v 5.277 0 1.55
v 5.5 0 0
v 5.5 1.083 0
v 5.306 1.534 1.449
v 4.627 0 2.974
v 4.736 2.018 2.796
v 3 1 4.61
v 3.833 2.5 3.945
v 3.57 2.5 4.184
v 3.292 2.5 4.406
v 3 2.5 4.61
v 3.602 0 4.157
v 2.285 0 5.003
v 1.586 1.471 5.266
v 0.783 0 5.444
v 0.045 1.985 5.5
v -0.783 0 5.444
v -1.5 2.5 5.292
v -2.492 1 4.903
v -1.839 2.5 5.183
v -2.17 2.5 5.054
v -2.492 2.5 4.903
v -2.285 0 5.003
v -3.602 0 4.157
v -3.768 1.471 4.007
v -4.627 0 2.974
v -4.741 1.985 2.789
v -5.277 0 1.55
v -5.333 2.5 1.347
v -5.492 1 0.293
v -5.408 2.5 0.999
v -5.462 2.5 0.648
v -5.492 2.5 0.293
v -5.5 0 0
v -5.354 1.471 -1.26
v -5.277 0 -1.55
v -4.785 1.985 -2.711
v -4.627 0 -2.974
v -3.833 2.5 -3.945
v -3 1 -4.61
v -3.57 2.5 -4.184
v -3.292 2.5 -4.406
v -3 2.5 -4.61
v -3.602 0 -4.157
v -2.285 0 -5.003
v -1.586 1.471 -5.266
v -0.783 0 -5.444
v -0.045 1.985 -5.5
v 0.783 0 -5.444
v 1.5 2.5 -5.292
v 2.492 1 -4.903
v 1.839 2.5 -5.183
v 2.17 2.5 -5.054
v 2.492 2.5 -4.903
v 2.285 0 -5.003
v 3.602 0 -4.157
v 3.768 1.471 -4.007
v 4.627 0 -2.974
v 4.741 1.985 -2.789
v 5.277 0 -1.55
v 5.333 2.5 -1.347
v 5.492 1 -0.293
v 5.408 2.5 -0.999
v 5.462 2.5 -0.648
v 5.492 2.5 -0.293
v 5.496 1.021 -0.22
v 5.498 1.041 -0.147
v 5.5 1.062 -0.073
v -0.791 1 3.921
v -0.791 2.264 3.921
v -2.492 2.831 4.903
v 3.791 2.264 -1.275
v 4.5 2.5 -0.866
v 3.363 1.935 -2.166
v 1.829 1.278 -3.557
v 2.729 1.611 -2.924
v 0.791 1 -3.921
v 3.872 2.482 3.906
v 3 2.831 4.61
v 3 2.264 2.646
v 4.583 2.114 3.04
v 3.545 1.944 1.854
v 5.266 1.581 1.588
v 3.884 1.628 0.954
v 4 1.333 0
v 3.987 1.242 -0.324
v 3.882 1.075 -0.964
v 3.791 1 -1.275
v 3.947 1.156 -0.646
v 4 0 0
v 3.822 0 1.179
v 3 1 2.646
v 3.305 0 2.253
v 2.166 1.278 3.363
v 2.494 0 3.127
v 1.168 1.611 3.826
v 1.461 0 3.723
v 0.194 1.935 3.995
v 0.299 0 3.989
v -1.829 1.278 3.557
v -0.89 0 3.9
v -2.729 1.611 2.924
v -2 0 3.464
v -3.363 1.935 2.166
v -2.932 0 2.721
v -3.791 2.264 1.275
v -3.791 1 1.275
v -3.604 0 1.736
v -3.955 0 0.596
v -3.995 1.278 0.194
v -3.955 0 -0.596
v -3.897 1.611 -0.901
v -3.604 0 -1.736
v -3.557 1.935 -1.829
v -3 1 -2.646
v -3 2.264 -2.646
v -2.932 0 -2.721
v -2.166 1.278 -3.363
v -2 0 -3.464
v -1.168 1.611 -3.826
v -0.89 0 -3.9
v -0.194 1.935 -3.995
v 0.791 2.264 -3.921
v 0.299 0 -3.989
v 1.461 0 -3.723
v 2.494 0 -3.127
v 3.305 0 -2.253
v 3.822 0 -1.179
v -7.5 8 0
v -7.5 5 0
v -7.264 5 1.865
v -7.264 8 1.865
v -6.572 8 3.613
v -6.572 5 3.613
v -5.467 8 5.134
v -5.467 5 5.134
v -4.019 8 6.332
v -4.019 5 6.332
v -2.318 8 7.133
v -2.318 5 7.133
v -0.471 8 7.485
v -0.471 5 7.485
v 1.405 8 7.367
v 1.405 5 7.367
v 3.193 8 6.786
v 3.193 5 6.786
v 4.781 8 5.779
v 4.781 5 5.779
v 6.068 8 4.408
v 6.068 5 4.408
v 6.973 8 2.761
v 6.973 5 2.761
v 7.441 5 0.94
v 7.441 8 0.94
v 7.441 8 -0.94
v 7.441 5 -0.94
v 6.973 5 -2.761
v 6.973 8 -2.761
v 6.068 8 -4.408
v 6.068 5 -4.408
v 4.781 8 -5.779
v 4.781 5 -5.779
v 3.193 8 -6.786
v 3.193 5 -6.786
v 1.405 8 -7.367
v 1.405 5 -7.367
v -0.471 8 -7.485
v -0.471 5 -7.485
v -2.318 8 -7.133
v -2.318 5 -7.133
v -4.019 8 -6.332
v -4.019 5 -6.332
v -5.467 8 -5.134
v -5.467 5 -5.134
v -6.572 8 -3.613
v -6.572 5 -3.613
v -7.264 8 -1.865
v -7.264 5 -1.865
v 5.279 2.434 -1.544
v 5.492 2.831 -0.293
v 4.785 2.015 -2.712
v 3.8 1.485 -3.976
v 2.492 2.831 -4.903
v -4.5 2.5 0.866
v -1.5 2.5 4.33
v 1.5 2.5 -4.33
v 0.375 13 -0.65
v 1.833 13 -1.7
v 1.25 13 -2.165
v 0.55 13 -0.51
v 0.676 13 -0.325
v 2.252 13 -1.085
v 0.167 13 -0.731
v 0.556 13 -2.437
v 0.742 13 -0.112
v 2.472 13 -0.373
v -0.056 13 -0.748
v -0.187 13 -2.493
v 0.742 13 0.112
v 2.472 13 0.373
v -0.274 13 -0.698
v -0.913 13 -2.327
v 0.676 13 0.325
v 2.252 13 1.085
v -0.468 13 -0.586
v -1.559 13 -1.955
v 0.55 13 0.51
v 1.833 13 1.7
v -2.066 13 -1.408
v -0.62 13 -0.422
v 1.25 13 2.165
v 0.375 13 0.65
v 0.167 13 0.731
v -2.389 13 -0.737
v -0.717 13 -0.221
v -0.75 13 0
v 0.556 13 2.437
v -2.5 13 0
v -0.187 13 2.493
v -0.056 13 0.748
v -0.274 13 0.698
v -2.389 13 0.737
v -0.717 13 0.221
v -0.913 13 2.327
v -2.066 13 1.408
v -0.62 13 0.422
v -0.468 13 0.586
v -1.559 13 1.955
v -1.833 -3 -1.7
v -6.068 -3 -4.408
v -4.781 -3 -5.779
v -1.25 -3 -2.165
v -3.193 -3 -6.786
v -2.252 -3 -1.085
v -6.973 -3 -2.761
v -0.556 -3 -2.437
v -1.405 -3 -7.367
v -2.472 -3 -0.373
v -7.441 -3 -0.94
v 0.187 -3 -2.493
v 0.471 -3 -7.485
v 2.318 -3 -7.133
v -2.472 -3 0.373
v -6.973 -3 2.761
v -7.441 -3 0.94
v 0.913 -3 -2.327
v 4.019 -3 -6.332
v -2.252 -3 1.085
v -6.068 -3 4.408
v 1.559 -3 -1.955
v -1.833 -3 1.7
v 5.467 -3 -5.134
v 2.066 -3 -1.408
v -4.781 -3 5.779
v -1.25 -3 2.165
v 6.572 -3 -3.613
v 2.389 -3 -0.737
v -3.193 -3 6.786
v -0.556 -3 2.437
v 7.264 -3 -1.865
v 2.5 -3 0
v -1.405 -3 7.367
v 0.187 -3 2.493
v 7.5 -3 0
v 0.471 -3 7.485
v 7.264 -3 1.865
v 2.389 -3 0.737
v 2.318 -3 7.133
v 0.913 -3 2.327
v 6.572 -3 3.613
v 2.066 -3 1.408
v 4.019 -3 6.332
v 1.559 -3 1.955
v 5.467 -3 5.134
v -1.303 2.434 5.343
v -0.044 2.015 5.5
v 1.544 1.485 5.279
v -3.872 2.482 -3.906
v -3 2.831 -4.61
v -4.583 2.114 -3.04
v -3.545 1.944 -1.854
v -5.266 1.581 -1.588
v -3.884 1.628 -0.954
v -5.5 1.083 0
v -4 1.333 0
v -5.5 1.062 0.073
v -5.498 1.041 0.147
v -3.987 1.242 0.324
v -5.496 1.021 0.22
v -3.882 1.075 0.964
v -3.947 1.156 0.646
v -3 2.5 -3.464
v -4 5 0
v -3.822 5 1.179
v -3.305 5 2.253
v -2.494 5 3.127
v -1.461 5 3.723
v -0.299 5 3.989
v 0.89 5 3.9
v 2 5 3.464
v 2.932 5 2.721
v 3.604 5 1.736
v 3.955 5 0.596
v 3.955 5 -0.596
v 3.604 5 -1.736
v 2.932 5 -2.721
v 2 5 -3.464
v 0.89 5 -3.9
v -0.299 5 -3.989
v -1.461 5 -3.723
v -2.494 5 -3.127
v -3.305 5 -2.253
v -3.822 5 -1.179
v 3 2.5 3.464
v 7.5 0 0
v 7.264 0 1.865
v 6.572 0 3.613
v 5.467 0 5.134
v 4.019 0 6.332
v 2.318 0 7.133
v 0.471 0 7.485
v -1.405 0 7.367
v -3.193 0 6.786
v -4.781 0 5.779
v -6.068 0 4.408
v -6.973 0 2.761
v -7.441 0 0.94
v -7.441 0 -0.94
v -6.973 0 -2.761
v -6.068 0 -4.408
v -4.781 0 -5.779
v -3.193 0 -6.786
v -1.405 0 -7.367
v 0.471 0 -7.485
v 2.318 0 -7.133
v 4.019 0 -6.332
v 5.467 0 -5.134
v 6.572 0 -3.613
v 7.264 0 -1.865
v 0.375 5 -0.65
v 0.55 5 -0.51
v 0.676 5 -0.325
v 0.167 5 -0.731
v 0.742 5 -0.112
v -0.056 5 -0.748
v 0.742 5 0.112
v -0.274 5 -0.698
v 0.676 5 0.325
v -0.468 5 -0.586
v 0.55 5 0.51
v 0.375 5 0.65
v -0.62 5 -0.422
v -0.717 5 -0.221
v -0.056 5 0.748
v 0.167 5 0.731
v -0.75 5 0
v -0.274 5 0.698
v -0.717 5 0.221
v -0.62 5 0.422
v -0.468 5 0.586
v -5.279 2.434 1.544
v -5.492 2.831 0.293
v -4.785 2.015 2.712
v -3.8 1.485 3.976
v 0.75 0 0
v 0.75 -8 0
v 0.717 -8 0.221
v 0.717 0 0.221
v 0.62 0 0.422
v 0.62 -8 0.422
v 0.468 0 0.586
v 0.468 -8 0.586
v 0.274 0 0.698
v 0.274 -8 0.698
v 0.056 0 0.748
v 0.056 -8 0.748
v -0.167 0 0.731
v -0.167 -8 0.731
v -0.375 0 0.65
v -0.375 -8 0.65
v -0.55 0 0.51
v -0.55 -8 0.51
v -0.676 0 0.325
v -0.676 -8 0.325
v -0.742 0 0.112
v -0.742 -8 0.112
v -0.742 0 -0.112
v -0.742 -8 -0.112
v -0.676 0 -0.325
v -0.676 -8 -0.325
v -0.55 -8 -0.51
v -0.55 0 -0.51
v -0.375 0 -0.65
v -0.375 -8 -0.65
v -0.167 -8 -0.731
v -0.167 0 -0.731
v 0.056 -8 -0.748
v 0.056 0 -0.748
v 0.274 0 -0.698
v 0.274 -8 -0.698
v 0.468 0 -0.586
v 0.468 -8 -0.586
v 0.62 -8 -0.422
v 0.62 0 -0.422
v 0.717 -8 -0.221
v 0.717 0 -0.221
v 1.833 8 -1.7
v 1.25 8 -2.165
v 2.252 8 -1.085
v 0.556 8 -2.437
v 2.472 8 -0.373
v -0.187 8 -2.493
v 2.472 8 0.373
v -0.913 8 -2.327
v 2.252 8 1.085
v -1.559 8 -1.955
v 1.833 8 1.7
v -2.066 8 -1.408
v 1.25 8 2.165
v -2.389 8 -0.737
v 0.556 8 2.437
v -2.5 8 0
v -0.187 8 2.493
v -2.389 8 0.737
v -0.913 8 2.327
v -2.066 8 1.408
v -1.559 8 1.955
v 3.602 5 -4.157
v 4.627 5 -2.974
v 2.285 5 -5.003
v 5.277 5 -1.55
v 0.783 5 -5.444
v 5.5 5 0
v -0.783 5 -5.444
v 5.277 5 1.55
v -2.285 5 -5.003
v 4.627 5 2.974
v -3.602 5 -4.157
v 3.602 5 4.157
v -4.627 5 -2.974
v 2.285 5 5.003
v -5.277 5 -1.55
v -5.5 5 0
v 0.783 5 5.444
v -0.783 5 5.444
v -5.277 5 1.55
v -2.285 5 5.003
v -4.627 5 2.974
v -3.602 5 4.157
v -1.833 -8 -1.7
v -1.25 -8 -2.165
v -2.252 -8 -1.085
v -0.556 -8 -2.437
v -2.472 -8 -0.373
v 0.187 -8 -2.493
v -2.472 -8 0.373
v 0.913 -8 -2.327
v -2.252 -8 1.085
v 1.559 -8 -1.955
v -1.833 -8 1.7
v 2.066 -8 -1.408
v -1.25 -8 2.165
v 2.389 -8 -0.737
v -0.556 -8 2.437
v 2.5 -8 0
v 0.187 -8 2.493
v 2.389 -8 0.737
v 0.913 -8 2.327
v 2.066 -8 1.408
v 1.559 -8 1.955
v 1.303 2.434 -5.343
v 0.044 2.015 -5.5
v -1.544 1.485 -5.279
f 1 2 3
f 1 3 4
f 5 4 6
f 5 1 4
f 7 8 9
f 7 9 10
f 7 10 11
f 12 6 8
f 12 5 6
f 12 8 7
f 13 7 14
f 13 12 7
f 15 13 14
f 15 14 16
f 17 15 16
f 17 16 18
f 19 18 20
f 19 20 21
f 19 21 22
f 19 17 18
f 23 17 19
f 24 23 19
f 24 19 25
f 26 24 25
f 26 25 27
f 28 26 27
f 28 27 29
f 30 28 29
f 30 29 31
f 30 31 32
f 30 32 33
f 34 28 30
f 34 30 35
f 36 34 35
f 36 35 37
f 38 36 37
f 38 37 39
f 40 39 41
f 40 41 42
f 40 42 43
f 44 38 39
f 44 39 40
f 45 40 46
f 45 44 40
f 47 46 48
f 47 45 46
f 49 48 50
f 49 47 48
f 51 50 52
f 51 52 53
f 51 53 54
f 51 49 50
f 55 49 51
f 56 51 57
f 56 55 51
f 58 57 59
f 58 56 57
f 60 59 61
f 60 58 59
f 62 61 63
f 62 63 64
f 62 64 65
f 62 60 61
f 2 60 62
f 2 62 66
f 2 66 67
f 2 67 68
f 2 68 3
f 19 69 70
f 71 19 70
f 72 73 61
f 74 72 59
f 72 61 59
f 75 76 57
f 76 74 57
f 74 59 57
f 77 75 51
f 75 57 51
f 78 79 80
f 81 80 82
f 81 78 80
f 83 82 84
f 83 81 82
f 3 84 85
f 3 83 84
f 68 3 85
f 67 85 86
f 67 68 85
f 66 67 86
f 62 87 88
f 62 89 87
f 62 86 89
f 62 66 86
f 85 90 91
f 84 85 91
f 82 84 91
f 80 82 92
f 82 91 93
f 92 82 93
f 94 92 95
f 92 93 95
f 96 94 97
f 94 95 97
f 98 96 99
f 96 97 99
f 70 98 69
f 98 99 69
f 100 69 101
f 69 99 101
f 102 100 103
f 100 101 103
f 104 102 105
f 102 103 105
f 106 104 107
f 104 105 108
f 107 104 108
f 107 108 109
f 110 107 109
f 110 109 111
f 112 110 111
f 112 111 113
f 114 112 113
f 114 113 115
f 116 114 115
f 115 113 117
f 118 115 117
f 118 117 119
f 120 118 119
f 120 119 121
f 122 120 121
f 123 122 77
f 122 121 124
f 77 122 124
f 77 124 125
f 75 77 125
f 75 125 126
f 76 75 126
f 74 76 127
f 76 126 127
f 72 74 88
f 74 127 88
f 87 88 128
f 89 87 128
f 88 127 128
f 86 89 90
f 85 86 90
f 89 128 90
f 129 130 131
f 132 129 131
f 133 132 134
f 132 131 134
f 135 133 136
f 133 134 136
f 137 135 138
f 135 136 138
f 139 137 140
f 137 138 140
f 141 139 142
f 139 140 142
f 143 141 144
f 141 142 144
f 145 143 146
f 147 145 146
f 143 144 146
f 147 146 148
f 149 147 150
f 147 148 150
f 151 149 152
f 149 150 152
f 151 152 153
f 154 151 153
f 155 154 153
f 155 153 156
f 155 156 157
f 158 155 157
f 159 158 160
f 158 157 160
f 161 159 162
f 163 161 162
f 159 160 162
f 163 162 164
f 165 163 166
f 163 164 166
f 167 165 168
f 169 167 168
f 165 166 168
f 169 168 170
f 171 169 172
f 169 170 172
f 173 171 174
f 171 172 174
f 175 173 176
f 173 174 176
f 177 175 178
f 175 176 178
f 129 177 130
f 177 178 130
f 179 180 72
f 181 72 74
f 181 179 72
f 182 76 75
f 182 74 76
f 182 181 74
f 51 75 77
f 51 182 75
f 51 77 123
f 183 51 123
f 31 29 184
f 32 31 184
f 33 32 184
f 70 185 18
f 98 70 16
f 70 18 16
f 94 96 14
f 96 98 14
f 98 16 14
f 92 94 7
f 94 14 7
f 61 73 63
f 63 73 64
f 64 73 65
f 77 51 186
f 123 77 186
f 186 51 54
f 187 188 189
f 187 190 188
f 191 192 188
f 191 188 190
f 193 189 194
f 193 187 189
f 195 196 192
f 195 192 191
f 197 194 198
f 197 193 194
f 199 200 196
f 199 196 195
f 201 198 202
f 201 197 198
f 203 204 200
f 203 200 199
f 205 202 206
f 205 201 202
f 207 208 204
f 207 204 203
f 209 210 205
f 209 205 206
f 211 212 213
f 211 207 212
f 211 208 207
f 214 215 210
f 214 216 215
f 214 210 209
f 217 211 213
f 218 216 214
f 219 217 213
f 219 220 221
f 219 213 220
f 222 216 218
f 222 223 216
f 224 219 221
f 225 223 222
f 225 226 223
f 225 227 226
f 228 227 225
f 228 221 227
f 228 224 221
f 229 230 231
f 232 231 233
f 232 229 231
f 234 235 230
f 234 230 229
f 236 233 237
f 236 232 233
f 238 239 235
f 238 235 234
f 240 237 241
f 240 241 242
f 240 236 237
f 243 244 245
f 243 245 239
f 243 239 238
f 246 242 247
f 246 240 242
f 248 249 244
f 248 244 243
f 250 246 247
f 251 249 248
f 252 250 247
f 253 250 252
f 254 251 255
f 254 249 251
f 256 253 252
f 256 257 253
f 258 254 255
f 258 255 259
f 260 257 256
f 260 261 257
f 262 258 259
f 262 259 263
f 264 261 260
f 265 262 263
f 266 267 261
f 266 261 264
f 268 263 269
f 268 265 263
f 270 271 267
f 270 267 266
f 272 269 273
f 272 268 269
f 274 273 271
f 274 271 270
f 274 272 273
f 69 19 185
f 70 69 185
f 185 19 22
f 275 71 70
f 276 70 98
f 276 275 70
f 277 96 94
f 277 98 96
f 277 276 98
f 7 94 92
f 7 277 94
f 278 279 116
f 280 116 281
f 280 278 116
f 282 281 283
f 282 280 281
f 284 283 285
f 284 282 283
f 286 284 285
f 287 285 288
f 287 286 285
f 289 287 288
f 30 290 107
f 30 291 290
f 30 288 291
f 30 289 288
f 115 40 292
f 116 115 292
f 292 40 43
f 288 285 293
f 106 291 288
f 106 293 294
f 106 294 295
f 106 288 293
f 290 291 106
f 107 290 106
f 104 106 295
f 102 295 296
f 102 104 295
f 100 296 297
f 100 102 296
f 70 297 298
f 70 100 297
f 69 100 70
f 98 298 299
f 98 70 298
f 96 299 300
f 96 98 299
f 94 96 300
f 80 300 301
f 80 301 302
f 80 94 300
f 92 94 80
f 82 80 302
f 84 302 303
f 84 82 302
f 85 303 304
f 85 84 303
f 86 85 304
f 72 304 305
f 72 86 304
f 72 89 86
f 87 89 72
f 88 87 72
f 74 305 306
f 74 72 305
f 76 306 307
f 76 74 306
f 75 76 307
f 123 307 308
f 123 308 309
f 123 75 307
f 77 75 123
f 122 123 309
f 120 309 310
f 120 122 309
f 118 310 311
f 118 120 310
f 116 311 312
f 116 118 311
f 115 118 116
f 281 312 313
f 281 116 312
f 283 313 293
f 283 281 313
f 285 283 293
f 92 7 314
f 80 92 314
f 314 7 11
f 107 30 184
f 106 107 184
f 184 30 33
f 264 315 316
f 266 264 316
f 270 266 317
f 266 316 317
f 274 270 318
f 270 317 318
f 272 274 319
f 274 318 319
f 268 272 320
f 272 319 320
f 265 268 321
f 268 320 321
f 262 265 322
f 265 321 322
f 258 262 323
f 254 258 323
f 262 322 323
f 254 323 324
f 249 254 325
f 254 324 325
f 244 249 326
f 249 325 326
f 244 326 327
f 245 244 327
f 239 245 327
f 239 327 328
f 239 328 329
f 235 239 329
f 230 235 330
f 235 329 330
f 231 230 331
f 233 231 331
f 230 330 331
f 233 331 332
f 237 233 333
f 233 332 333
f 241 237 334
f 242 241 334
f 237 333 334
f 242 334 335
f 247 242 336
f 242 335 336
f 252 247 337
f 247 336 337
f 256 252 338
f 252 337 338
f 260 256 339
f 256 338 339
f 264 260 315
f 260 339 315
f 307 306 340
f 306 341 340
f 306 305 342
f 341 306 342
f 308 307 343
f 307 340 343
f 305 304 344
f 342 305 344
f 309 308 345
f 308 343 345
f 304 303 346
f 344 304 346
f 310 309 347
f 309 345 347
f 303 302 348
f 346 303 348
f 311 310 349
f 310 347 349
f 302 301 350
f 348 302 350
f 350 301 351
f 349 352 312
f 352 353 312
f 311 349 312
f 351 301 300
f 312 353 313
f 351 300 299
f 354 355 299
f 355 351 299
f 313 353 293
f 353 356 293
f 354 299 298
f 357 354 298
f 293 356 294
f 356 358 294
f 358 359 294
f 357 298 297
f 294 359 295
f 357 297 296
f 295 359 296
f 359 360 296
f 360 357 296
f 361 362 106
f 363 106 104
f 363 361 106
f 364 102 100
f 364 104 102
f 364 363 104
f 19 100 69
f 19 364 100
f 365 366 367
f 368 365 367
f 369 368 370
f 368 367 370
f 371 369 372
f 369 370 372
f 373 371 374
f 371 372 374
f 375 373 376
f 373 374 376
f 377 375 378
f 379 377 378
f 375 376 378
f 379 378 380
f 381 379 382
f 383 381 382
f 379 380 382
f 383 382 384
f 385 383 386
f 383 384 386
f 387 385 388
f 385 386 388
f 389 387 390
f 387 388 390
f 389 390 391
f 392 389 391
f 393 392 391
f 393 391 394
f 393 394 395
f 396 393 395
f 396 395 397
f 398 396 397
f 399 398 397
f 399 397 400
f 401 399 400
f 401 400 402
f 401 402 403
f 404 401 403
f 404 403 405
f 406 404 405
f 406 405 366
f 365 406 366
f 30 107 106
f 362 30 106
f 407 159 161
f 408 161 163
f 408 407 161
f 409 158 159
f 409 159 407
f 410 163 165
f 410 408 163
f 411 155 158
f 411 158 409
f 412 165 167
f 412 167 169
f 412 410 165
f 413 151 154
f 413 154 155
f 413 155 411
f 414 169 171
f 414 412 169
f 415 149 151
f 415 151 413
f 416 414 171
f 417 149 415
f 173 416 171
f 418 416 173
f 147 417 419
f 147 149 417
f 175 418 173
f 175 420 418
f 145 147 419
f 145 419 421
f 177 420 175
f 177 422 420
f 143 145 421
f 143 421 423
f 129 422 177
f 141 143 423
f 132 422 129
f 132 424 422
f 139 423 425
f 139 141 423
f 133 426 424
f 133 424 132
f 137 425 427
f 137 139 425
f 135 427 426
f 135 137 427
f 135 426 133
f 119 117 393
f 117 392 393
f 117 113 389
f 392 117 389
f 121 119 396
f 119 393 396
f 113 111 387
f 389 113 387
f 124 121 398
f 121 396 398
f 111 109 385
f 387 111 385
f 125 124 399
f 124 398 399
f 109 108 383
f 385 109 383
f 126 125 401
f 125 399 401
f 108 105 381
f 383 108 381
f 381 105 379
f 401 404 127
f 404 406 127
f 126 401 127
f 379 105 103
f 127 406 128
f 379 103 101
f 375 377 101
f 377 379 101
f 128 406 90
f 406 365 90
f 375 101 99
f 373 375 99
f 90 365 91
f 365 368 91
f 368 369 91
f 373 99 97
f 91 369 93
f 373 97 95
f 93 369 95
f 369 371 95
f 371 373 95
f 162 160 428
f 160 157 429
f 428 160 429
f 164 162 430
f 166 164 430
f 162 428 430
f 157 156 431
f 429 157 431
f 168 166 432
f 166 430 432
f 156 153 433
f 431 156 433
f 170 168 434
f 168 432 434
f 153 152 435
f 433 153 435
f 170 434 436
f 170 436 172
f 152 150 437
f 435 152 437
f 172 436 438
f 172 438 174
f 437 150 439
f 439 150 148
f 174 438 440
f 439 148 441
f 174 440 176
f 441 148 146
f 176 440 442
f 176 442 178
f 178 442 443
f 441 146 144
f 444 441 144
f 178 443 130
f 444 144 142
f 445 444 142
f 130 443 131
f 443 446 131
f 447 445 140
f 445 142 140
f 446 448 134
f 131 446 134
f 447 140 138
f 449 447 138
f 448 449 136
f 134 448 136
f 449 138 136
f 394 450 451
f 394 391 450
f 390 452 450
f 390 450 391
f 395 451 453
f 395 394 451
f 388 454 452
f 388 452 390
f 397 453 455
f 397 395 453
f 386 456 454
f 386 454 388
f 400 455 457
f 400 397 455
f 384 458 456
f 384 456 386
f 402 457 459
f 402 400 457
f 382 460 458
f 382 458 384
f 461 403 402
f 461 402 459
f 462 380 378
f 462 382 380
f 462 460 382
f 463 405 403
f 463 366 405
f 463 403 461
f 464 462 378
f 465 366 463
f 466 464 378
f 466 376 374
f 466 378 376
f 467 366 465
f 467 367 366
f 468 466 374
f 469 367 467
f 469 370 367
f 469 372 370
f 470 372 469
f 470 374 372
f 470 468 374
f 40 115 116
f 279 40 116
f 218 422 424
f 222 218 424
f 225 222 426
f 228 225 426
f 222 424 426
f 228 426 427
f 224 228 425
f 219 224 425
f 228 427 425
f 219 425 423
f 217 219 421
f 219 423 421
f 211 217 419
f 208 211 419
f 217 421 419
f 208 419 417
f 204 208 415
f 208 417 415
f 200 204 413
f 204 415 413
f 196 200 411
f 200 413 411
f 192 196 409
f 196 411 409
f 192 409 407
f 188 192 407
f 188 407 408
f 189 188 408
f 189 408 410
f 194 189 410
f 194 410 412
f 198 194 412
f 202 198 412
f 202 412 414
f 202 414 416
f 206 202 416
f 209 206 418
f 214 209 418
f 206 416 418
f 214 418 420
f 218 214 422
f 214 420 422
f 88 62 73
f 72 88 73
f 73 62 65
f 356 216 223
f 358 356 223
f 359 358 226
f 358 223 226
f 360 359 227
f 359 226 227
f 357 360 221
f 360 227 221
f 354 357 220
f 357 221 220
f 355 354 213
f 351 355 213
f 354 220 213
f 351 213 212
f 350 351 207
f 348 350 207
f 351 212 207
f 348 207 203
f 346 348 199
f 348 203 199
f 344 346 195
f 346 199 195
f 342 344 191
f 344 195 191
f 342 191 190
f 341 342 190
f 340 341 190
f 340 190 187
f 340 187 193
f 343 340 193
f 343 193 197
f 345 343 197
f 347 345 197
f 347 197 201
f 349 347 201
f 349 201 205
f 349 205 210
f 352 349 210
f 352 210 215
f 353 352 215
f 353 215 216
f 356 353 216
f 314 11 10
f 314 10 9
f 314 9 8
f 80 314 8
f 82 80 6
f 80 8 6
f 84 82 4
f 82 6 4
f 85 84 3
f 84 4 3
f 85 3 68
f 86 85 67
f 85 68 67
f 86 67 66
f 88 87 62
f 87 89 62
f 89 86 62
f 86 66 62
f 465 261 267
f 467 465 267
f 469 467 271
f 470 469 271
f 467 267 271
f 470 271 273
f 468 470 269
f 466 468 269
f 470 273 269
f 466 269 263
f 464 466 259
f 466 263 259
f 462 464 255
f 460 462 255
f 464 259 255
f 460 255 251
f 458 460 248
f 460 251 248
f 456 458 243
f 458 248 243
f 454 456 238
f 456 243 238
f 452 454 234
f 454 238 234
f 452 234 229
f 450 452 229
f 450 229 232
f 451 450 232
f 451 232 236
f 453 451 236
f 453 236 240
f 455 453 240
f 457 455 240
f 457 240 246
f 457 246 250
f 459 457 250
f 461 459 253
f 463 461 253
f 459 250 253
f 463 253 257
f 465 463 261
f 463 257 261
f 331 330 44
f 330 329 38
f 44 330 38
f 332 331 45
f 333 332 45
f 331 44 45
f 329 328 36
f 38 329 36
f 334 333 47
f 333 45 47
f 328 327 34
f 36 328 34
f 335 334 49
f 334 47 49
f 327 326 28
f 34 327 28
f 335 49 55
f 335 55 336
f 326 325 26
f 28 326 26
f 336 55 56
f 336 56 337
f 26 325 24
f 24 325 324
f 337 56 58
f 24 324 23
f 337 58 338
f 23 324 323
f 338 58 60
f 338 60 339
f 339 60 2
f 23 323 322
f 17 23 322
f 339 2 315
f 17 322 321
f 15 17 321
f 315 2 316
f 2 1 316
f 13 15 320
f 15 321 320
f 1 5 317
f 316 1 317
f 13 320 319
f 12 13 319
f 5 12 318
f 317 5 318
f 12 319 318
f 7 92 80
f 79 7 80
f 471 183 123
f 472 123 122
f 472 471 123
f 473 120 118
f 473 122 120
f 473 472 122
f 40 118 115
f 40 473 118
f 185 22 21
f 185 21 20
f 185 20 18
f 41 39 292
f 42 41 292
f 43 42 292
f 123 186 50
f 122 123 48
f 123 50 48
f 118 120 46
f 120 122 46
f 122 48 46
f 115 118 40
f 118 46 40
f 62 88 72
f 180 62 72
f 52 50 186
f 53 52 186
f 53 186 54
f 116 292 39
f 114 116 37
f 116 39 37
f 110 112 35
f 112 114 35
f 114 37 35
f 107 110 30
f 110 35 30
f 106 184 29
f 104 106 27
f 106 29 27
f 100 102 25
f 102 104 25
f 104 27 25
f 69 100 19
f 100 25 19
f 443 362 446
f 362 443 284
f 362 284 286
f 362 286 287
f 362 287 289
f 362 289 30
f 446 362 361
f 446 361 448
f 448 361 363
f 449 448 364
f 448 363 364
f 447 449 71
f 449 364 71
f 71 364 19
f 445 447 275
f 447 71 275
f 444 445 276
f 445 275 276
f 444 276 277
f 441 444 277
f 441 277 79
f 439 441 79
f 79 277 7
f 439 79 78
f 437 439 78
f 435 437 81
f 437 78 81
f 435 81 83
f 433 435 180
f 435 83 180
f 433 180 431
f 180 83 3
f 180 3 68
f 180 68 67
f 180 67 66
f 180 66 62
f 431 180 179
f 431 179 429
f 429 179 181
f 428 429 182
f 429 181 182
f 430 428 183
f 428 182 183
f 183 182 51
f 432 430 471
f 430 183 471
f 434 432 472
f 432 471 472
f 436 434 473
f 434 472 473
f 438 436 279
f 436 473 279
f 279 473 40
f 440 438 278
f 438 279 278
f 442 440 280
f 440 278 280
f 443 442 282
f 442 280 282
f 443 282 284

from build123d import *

# Parameters (mm, degrees)
F0_R      = 7.5
F1_DEPTH  = 3
F2_R      = 2.5
F3_DEPTH  = 5
F4_R      = 0.75
F5_DEPTH  = 8.001
F6_R      = 5.5
F6_R_2    = 4
F7_DEPTH  = 6
F10_DEPTH = 10
F11_COUNT = 6
F13_R     = 5.5
F13_R_2   = 4
F14_DEPTH = 5
F15_R     = 7.5
F16_DEPTH = 3
F17_R     = 2.5
F18_DEPTH = 5
F19_R     = 0.75
F20_DEPTH = 25
F22_R     = 7.5
F23_DEPTH = 2.5


with BuildPart() as f1:
    # F0 (on Front) → F1 (new body)
    with BuildSketch(Plane.XZ):
        Circle(F0_R)
    extrude(amount=F1_DEPTH)

    # F2 (on face) → F3 (join)
    with BuildSketch(Plane.XZ.offset(3)):
        Circle(F2_R)
    extrude(amount=F3_DEPTH)

    # F4 (on face) → F5 (cut, through all)
    with BuildSketch(Plane.XZ.offset(8)):
        Circle(F4_R)
    extrude(amount=-F5_DEPTH, mode=Mode.SUBTRACT)

    # F6 (on face) → F7 (join)
    with BuildSketch(Plane.XZ.offset(3)):
        Circle(F6_R)
        Circle(F6_R_2, mode=Mode.SUBTRACT)
    extrude(amount=-F7_DEPTH)


with BuildPart() as f10:
    # F9 (on offset) → F10 (new body)
    with BuildSketch(Plane.XY.offset(10)):
        Polygon((-3, 3), (3, 1), (3, 3), align=None)
    extrude(amount=-F10_DEPTH)


with BuildPart() as f11_1:
    # F11: instance of F10
    add(f10.part.rotate(Axis((0, 3, 0), (0, -1, 0)), 1 * 360 / F11_COUNT))


with BuildPart() as f11_2:
    # F11: instance of F10
    add(f10.part.rotate(Axis((0, 3, 0), (0, -1, 0)), 2 * 360 / F11_COUNT))


with BuildPart() as f11_3:
    # F11: instance of F10
    add(f10.part.rotate(Axis((0, 3, 0), (0, -1, 0)), 3 * 360 / F11_COUNT))


with BuildPart() as f11_4:
    # F11: instance of F10
    add(f10.part.rotate(Axis((0, 3, 0), (0, -1, 0)), 4 * 360 / F11_COUNT))


with BuildPart() as f11_5:
    # F11: instance of F10
    add(f10.part.rotate(Axis((0, 3, 0), (0, -1, 0)), 5 * 360 / F11_COUNT))


with BuildPart() as f1_1:
    add(f1.part)

    # F12: cut F11_3, F10, F11_4, F11_5, F11_1, F11_2
    add(f11_3.part, mode=Mode.SUBTRACT)
    add(f10.part, mode=Mode.SUBTRACT)
    add(f11_4.part, mode=Mode.SUBTRACT)
    add(f11_5.part, mode=Mode.SUBTRACT)
    add(f11_1.part, mode=Mode.SUBTRACT)
    add(f11_2.part, mode=Mode.SUBTRACT)


with BuildPart() as f14:
    # F13 (on face) → F14 (new body)
    with BuildSketch(Plane(origin=(0, 0, 0), x_dir=(-1, 0, 0), z_dir=(0, 1, 0))):
        Circle(F13_R)
        Circle(F13_R_2, mode=Mode.SUBTRACT)
    extrude(amount=F14_DEPTH)

    # F15 (on face) → F16 (join)
    with BuildSketch(Plane(origin=(0, 5, 0), x_dir=(-1, 0, 0), z_dir=(0, 1, 0))):
        Circle(F15_R)
    extrude(amount=F16_DEPTH)

    # F17 (on face) → F18 (join)
    with BuildSketch(Plane(origin=(0, 8, 0), x_dir=(-1, 0, 0), z_dir=(0, 1, 0))):
        Circle(F17_R)
    extrude(amount=F18_DEPTH)

    # F19 (on face) → F20 (cut)
    with BuildSketch(Plane(origin=(0, 13, 0), x_dir=(-1, 0, 0), z_dir=(0, 1, 0))):
        Circle(F19_R)
    extrude(amount=-F20_DEPTH, mode=Mode.SUBTRACT)

    # F21: cut F1
    add(f1_1.part, mode=Mode.SUBTRACT)


with BuildPart() as f1_2:
    add(f1_1.part)

    # F22 (on face) → F23 (cut)
    with BuildSketch(Plane.XZ.offset(-5)):
        Circle(F22_R)
    extrude(amount=F23_DEPTH, mode=Mode.SUBTRACT)


solid = Compound([f14.part, f1_2.part])
